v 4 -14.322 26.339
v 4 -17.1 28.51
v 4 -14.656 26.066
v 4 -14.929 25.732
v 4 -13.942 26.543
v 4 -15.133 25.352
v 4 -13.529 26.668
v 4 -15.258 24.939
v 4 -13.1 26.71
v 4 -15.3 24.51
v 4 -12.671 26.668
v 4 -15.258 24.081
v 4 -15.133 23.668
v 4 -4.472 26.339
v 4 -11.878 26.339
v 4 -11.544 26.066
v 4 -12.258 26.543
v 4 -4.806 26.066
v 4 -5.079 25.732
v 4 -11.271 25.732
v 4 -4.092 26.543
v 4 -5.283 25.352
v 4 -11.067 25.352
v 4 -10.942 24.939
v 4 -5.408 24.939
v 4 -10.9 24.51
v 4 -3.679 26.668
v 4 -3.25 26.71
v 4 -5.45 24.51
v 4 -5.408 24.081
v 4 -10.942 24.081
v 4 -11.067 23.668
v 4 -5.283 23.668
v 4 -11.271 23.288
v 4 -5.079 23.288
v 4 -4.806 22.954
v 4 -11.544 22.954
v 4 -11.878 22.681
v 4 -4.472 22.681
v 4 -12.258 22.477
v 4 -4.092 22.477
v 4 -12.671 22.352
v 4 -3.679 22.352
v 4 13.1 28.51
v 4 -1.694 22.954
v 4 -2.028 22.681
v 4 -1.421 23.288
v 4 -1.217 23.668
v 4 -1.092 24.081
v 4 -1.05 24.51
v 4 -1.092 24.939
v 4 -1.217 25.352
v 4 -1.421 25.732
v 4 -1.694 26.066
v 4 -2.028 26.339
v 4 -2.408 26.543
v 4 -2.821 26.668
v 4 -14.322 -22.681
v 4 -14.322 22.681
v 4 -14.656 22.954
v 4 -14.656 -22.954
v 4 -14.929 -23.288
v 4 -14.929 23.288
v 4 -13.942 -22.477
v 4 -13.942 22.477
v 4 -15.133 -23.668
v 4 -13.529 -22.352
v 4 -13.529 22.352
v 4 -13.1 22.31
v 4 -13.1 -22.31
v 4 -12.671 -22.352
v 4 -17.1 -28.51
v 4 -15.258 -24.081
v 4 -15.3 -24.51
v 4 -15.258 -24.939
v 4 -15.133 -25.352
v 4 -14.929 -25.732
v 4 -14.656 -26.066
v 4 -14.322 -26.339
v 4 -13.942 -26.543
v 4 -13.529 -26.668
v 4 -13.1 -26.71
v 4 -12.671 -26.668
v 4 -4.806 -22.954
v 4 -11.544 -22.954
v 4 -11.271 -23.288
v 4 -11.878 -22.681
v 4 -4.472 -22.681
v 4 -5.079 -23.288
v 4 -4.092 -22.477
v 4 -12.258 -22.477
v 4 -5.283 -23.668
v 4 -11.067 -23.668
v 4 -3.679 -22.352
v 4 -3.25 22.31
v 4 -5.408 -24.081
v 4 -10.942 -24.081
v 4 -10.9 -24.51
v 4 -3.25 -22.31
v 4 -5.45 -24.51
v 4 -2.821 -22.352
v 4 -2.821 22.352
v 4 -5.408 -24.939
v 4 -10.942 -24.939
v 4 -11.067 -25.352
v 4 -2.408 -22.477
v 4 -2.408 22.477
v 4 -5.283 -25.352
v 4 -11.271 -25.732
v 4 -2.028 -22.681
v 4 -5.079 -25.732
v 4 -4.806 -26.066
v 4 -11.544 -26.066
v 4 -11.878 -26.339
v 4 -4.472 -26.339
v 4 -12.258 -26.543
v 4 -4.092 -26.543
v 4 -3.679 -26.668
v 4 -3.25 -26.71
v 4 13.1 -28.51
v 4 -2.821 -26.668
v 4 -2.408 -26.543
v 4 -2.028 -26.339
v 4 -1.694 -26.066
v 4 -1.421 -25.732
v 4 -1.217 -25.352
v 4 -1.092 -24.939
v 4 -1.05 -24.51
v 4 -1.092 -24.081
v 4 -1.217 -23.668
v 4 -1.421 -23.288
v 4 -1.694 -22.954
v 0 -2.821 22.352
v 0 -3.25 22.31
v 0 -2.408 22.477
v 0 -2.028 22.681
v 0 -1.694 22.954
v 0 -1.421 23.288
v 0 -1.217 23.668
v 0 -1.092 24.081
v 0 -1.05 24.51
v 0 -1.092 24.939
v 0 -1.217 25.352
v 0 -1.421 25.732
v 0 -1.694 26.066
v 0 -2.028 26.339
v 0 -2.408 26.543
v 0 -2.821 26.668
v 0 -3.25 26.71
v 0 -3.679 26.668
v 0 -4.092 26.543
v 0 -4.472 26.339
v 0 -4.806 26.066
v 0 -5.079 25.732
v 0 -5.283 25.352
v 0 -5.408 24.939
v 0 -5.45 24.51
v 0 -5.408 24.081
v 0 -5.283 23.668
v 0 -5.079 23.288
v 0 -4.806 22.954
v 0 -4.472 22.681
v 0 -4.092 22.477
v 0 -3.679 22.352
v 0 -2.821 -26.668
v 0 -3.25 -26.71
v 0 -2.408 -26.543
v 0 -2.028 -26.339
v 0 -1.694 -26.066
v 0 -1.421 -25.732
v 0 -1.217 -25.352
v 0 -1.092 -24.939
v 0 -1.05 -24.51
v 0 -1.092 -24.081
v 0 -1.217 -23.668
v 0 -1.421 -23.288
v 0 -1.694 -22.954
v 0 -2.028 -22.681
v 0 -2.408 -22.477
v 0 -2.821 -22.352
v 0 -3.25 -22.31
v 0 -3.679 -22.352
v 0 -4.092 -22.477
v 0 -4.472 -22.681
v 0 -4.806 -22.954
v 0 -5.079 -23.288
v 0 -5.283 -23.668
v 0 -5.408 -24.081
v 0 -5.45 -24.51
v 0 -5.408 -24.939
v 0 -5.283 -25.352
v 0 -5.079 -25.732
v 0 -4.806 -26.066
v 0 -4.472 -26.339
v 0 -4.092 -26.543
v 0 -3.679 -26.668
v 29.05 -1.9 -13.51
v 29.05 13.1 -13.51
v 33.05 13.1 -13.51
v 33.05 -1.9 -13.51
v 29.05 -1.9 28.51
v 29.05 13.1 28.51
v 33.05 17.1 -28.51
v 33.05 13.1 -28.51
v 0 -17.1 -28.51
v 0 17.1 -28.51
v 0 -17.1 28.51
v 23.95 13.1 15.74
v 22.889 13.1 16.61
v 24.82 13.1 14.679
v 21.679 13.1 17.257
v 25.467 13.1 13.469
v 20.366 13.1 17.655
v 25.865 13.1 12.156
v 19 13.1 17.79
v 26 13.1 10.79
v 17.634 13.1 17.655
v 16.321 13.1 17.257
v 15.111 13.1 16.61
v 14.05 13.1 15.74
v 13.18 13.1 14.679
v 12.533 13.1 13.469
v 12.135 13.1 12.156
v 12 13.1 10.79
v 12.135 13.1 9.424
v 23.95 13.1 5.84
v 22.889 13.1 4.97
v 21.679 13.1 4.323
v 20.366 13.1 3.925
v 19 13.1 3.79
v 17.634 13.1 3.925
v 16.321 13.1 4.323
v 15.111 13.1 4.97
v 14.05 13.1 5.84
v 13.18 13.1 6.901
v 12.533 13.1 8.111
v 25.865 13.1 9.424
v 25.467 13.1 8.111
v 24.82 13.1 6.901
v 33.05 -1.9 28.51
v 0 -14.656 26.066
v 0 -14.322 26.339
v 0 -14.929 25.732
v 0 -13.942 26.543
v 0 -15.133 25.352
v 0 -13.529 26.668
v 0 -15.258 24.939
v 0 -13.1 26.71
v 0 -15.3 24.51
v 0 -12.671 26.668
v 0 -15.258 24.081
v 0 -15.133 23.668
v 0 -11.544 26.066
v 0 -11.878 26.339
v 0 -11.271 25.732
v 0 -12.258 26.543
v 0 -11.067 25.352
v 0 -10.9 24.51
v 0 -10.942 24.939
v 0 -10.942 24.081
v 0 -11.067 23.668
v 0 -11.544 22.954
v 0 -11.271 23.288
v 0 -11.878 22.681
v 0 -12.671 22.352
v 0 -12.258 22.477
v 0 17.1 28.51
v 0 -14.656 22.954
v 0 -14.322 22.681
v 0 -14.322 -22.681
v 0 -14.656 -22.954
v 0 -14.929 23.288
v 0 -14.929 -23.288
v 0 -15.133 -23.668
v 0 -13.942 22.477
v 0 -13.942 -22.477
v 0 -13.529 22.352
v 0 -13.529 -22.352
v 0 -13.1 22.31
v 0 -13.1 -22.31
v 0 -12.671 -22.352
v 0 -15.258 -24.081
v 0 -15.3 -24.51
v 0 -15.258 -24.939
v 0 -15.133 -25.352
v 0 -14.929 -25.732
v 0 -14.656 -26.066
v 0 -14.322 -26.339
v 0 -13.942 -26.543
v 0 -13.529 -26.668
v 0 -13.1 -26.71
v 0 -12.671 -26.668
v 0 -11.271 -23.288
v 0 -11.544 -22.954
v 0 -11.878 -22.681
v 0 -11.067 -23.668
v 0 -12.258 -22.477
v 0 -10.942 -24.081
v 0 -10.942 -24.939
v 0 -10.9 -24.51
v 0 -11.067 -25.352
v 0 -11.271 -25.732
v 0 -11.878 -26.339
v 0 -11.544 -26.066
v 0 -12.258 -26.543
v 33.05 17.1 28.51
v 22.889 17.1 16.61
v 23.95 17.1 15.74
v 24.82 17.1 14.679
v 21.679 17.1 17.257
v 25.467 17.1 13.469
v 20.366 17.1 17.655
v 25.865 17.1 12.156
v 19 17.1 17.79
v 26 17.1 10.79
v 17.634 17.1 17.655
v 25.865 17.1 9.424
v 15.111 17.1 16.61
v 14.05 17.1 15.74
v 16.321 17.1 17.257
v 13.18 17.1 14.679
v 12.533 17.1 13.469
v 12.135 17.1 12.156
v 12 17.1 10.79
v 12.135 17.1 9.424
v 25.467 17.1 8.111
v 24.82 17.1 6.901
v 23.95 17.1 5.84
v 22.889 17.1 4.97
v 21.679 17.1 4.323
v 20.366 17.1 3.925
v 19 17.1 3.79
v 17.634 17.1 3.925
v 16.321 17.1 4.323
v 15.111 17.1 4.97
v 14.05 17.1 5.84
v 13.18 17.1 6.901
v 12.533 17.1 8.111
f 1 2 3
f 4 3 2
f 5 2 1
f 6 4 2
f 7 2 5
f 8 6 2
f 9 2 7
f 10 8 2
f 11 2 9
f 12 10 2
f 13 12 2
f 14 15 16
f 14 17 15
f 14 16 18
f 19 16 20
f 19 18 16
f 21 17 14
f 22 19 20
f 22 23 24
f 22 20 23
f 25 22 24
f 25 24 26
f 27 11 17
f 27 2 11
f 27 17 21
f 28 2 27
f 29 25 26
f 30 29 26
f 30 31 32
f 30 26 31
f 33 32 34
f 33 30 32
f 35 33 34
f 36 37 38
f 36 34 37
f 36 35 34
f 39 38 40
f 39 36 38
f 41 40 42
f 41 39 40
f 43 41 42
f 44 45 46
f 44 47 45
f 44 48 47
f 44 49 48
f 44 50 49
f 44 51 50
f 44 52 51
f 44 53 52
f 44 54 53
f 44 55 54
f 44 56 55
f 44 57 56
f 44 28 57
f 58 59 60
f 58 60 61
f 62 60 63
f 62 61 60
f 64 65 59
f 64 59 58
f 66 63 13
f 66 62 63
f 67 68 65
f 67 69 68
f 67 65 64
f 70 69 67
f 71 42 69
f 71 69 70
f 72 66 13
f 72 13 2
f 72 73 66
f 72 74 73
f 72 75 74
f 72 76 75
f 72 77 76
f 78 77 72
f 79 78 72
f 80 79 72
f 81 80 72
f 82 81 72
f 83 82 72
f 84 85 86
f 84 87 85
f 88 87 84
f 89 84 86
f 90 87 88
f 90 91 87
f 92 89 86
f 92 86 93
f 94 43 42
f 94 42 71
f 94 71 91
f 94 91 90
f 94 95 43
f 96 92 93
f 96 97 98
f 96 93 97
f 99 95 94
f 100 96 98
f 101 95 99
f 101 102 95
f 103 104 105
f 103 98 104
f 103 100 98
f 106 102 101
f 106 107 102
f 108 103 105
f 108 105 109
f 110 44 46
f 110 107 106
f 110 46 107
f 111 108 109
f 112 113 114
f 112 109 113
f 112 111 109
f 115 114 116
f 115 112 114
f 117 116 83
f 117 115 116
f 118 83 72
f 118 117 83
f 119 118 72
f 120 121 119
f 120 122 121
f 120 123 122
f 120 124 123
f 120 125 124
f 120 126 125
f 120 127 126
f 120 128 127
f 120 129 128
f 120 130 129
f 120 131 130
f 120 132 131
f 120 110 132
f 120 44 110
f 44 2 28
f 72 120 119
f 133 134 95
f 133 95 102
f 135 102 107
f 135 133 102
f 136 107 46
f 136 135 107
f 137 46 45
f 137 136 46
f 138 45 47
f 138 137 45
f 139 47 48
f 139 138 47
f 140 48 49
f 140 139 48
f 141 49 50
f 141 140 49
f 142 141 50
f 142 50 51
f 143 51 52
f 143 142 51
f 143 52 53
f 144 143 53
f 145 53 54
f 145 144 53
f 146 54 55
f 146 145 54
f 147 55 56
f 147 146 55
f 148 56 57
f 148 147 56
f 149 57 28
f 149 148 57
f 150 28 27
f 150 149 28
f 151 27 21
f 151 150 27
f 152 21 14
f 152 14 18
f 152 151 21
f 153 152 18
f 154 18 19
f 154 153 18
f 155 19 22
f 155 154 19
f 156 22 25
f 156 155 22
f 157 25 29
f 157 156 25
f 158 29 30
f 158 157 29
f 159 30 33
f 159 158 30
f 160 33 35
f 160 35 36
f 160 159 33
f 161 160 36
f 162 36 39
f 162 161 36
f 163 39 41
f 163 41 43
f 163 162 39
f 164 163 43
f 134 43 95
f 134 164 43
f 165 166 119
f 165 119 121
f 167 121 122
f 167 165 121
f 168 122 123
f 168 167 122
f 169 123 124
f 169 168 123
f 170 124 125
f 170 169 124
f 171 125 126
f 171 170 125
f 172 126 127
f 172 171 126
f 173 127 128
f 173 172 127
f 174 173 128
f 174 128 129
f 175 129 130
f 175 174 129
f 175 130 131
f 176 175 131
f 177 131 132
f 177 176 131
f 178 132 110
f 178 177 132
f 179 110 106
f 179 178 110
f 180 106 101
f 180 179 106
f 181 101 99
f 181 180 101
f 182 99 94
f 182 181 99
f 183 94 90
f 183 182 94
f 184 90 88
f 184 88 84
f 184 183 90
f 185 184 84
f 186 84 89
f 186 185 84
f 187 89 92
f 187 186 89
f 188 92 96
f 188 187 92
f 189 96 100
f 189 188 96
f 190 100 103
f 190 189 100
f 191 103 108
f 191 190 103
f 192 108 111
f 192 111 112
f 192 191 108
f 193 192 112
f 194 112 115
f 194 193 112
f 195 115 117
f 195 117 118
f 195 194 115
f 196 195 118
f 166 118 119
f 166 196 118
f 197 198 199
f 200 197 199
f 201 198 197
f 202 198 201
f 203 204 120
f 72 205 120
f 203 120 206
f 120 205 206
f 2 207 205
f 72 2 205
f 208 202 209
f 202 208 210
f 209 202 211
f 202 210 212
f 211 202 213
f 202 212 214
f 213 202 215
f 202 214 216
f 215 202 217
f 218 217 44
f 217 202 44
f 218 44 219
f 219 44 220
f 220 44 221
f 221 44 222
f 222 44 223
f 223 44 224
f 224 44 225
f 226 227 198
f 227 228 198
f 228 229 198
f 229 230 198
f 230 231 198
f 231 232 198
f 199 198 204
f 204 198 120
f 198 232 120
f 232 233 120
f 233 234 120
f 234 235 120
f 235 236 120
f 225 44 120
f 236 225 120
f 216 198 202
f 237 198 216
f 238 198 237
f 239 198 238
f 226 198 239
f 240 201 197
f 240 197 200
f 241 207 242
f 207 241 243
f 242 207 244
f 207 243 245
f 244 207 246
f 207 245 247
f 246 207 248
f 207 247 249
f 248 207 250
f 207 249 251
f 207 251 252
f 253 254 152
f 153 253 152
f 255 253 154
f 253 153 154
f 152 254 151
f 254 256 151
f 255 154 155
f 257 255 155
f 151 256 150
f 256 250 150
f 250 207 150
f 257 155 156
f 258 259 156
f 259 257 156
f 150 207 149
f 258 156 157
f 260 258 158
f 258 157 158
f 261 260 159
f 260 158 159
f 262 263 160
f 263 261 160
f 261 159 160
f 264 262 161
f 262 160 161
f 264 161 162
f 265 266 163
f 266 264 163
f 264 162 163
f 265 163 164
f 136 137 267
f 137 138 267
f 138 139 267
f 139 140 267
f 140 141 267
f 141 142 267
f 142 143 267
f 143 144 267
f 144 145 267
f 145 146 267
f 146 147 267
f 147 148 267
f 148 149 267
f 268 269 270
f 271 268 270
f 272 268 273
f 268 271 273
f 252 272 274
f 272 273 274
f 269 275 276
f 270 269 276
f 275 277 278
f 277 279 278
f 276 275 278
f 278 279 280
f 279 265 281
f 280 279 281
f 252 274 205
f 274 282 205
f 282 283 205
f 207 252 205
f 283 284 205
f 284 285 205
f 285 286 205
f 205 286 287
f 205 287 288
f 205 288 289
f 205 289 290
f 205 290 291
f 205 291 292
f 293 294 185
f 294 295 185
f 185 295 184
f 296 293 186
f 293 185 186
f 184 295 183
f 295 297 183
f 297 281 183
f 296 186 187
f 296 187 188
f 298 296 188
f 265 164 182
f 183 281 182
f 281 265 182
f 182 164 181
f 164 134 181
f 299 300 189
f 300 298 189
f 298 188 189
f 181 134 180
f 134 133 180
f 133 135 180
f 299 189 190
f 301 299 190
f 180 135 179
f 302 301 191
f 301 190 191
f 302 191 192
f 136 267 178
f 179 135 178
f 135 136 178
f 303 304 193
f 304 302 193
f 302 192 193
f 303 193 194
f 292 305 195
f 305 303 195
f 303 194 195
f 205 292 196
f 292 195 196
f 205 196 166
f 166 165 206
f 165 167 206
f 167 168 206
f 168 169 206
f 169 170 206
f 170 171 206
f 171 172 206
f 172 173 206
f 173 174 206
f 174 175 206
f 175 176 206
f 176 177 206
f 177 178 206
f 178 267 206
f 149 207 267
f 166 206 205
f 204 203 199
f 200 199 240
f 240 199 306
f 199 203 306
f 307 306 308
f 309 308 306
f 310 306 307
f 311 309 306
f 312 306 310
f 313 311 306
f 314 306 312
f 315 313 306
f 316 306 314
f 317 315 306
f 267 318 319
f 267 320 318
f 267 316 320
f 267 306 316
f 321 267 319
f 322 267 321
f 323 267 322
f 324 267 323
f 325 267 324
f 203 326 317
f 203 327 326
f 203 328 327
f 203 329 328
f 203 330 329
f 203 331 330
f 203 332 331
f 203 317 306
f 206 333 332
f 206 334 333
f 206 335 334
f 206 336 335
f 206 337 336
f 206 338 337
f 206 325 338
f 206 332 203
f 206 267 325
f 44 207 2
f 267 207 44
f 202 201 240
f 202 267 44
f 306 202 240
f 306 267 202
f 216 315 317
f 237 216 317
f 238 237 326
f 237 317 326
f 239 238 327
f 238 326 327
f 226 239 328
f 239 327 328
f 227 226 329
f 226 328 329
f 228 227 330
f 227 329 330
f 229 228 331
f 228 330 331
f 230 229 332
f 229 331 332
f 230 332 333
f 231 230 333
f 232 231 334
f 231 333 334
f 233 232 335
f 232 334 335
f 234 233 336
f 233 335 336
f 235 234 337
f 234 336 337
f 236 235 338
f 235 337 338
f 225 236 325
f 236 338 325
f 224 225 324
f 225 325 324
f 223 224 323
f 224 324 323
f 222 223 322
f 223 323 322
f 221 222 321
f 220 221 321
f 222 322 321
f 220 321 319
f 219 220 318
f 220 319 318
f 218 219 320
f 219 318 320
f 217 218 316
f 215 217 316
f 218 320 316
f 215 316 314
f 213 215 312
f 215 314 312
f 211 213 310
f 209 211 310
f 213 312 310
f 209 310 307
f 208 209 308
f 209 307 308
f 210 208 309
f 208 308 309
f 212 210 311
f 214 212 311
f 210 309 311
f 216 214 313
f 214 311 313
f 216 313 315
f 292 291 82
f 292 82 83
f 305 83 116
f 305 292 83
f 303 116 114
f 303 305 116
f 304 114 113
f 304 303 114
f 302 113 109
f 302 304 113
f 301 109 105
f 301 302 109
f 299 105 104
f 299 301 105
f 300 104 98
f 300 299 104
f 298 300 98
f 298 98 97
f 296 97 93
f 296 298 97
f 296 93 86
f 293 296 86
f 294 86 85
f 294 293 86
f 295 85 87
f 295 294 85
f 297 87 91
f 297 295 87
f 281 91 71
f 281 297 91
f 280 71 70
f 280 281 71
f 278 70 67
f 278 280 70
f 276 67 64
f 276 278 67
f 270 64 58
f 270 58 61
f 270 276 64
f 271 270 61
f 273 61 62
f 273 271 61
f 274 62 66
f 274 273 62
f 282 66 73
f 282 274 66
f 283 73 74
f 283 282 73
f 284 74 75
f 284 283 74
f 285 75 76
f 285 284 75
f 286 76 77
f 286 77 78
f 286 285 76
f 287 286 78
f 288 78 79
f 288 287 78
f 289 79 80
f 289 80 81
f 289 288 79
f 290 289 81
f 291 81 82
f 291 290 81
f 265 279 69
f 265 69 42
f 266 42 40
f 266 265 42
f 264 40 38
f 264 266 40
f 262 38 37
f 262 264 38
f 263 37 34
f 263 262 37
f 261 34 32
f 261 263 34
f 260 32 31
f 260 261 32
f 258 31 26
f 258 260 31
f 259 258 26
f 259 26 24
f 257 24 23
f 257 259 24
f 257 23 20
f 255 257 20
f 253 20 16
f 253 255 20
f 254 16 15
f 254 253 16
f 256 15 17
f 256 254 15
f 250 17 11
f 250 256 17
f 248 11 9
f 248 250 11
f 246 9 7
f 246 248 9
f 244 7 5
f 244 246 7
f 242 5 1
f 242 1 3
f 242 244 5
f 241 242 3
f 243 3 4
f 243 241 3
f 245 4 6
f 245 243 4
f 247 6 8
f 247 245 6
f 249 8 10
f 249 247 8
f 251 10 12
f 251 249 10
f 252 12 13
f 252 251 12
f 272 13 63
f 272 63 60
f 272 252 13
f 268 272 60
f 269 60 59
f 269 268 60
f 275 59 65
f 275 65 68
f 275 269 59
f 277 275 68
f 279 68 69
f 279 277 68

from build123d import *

# Parameters (mm, degrees)
SKETCH1_W           = 57.02
SKETCH1_H           = 34.2
SKETCH1_R           = 2.2
BOSS_EXTRUDE1_DEPTH = 4
SKETCH2_W           = 57.02
SKETCH2_H           = 4
BOSS_EXTRUDE2_DEPTH = 29.05
SKETCH3_W           = 4
SKETCH3_H           = 42.02
BOSS_EXTRUDE3_DEPTH = 15
SKETCH5_R           = 7
CUT_EXTRUDE1_DEPTH  = 4


with BuildPart() as part:
    # Sketch1 → Boss-Extrude1 (new body)
    with BuildSketch(Plane(origin=(0, 0, 0), x_dir=(0, 0, -1), z_dir=(1, 0, 0))):
        Rectangle(SKETCH1_W, SKETCH1_H)
        with Locations((-24.51, -3.25)):
            Circle(SKETCH1_R, mode=Mode.SUBTRACT)
        with Locations((-24.51, -13.1)):
            Circle(SKETCH1_R, mode=Mode.SUBTRACT)
        with Locations((24.51, -3.25)):
            Circle(SKETCH1_R, mode=Mode.SUBTRACT)
        with Locations((24.51, -13.1)):
            Circle(SKETCH1_R, mode=Mode.SUBTRACT)
    extrude(amount=BOSS_EXTRUDE1_DEPTH)

    # Sketch2 → Boss-Extrude2 (add)
    with BuildSketch(Plane(origin=(4, 0, 0), x_dir=(0, 0, -1), z_dir=(1, 0, 0))):
        with Locations((0, 15.1)):
            Rectangle(SKETCH2_W, SKETCH2_H)
    extrude(amount=BOSS_EXTRUDE2_DEPTH)

    # Sketch3 → Boss-Extrude3 (add)
    with BuildSketch(Plane.XZ.offset(-13.1)):
        with Locations((31.05, 7.5)):
            Rectangle(SKETCH3_W, SKETCH3_H)
    extrude(amount=BOSS_EXTRUDE3_DEPTH)

    # Sketch5 → Cut-Extrude1 (cut)
    with BuildSketch(Plane(origin=(0, 17.1, 0), x_dir=(1, 0, 0), z_dir=(0, 1, 0))):
        with Locations((19, -10.79)):
            Circle(SKETCH5_R)
    extrude(amount=-CUT_EXTRUDE1_DEPTH, mode=Mode.SUBTRACT)


solid = part.part
